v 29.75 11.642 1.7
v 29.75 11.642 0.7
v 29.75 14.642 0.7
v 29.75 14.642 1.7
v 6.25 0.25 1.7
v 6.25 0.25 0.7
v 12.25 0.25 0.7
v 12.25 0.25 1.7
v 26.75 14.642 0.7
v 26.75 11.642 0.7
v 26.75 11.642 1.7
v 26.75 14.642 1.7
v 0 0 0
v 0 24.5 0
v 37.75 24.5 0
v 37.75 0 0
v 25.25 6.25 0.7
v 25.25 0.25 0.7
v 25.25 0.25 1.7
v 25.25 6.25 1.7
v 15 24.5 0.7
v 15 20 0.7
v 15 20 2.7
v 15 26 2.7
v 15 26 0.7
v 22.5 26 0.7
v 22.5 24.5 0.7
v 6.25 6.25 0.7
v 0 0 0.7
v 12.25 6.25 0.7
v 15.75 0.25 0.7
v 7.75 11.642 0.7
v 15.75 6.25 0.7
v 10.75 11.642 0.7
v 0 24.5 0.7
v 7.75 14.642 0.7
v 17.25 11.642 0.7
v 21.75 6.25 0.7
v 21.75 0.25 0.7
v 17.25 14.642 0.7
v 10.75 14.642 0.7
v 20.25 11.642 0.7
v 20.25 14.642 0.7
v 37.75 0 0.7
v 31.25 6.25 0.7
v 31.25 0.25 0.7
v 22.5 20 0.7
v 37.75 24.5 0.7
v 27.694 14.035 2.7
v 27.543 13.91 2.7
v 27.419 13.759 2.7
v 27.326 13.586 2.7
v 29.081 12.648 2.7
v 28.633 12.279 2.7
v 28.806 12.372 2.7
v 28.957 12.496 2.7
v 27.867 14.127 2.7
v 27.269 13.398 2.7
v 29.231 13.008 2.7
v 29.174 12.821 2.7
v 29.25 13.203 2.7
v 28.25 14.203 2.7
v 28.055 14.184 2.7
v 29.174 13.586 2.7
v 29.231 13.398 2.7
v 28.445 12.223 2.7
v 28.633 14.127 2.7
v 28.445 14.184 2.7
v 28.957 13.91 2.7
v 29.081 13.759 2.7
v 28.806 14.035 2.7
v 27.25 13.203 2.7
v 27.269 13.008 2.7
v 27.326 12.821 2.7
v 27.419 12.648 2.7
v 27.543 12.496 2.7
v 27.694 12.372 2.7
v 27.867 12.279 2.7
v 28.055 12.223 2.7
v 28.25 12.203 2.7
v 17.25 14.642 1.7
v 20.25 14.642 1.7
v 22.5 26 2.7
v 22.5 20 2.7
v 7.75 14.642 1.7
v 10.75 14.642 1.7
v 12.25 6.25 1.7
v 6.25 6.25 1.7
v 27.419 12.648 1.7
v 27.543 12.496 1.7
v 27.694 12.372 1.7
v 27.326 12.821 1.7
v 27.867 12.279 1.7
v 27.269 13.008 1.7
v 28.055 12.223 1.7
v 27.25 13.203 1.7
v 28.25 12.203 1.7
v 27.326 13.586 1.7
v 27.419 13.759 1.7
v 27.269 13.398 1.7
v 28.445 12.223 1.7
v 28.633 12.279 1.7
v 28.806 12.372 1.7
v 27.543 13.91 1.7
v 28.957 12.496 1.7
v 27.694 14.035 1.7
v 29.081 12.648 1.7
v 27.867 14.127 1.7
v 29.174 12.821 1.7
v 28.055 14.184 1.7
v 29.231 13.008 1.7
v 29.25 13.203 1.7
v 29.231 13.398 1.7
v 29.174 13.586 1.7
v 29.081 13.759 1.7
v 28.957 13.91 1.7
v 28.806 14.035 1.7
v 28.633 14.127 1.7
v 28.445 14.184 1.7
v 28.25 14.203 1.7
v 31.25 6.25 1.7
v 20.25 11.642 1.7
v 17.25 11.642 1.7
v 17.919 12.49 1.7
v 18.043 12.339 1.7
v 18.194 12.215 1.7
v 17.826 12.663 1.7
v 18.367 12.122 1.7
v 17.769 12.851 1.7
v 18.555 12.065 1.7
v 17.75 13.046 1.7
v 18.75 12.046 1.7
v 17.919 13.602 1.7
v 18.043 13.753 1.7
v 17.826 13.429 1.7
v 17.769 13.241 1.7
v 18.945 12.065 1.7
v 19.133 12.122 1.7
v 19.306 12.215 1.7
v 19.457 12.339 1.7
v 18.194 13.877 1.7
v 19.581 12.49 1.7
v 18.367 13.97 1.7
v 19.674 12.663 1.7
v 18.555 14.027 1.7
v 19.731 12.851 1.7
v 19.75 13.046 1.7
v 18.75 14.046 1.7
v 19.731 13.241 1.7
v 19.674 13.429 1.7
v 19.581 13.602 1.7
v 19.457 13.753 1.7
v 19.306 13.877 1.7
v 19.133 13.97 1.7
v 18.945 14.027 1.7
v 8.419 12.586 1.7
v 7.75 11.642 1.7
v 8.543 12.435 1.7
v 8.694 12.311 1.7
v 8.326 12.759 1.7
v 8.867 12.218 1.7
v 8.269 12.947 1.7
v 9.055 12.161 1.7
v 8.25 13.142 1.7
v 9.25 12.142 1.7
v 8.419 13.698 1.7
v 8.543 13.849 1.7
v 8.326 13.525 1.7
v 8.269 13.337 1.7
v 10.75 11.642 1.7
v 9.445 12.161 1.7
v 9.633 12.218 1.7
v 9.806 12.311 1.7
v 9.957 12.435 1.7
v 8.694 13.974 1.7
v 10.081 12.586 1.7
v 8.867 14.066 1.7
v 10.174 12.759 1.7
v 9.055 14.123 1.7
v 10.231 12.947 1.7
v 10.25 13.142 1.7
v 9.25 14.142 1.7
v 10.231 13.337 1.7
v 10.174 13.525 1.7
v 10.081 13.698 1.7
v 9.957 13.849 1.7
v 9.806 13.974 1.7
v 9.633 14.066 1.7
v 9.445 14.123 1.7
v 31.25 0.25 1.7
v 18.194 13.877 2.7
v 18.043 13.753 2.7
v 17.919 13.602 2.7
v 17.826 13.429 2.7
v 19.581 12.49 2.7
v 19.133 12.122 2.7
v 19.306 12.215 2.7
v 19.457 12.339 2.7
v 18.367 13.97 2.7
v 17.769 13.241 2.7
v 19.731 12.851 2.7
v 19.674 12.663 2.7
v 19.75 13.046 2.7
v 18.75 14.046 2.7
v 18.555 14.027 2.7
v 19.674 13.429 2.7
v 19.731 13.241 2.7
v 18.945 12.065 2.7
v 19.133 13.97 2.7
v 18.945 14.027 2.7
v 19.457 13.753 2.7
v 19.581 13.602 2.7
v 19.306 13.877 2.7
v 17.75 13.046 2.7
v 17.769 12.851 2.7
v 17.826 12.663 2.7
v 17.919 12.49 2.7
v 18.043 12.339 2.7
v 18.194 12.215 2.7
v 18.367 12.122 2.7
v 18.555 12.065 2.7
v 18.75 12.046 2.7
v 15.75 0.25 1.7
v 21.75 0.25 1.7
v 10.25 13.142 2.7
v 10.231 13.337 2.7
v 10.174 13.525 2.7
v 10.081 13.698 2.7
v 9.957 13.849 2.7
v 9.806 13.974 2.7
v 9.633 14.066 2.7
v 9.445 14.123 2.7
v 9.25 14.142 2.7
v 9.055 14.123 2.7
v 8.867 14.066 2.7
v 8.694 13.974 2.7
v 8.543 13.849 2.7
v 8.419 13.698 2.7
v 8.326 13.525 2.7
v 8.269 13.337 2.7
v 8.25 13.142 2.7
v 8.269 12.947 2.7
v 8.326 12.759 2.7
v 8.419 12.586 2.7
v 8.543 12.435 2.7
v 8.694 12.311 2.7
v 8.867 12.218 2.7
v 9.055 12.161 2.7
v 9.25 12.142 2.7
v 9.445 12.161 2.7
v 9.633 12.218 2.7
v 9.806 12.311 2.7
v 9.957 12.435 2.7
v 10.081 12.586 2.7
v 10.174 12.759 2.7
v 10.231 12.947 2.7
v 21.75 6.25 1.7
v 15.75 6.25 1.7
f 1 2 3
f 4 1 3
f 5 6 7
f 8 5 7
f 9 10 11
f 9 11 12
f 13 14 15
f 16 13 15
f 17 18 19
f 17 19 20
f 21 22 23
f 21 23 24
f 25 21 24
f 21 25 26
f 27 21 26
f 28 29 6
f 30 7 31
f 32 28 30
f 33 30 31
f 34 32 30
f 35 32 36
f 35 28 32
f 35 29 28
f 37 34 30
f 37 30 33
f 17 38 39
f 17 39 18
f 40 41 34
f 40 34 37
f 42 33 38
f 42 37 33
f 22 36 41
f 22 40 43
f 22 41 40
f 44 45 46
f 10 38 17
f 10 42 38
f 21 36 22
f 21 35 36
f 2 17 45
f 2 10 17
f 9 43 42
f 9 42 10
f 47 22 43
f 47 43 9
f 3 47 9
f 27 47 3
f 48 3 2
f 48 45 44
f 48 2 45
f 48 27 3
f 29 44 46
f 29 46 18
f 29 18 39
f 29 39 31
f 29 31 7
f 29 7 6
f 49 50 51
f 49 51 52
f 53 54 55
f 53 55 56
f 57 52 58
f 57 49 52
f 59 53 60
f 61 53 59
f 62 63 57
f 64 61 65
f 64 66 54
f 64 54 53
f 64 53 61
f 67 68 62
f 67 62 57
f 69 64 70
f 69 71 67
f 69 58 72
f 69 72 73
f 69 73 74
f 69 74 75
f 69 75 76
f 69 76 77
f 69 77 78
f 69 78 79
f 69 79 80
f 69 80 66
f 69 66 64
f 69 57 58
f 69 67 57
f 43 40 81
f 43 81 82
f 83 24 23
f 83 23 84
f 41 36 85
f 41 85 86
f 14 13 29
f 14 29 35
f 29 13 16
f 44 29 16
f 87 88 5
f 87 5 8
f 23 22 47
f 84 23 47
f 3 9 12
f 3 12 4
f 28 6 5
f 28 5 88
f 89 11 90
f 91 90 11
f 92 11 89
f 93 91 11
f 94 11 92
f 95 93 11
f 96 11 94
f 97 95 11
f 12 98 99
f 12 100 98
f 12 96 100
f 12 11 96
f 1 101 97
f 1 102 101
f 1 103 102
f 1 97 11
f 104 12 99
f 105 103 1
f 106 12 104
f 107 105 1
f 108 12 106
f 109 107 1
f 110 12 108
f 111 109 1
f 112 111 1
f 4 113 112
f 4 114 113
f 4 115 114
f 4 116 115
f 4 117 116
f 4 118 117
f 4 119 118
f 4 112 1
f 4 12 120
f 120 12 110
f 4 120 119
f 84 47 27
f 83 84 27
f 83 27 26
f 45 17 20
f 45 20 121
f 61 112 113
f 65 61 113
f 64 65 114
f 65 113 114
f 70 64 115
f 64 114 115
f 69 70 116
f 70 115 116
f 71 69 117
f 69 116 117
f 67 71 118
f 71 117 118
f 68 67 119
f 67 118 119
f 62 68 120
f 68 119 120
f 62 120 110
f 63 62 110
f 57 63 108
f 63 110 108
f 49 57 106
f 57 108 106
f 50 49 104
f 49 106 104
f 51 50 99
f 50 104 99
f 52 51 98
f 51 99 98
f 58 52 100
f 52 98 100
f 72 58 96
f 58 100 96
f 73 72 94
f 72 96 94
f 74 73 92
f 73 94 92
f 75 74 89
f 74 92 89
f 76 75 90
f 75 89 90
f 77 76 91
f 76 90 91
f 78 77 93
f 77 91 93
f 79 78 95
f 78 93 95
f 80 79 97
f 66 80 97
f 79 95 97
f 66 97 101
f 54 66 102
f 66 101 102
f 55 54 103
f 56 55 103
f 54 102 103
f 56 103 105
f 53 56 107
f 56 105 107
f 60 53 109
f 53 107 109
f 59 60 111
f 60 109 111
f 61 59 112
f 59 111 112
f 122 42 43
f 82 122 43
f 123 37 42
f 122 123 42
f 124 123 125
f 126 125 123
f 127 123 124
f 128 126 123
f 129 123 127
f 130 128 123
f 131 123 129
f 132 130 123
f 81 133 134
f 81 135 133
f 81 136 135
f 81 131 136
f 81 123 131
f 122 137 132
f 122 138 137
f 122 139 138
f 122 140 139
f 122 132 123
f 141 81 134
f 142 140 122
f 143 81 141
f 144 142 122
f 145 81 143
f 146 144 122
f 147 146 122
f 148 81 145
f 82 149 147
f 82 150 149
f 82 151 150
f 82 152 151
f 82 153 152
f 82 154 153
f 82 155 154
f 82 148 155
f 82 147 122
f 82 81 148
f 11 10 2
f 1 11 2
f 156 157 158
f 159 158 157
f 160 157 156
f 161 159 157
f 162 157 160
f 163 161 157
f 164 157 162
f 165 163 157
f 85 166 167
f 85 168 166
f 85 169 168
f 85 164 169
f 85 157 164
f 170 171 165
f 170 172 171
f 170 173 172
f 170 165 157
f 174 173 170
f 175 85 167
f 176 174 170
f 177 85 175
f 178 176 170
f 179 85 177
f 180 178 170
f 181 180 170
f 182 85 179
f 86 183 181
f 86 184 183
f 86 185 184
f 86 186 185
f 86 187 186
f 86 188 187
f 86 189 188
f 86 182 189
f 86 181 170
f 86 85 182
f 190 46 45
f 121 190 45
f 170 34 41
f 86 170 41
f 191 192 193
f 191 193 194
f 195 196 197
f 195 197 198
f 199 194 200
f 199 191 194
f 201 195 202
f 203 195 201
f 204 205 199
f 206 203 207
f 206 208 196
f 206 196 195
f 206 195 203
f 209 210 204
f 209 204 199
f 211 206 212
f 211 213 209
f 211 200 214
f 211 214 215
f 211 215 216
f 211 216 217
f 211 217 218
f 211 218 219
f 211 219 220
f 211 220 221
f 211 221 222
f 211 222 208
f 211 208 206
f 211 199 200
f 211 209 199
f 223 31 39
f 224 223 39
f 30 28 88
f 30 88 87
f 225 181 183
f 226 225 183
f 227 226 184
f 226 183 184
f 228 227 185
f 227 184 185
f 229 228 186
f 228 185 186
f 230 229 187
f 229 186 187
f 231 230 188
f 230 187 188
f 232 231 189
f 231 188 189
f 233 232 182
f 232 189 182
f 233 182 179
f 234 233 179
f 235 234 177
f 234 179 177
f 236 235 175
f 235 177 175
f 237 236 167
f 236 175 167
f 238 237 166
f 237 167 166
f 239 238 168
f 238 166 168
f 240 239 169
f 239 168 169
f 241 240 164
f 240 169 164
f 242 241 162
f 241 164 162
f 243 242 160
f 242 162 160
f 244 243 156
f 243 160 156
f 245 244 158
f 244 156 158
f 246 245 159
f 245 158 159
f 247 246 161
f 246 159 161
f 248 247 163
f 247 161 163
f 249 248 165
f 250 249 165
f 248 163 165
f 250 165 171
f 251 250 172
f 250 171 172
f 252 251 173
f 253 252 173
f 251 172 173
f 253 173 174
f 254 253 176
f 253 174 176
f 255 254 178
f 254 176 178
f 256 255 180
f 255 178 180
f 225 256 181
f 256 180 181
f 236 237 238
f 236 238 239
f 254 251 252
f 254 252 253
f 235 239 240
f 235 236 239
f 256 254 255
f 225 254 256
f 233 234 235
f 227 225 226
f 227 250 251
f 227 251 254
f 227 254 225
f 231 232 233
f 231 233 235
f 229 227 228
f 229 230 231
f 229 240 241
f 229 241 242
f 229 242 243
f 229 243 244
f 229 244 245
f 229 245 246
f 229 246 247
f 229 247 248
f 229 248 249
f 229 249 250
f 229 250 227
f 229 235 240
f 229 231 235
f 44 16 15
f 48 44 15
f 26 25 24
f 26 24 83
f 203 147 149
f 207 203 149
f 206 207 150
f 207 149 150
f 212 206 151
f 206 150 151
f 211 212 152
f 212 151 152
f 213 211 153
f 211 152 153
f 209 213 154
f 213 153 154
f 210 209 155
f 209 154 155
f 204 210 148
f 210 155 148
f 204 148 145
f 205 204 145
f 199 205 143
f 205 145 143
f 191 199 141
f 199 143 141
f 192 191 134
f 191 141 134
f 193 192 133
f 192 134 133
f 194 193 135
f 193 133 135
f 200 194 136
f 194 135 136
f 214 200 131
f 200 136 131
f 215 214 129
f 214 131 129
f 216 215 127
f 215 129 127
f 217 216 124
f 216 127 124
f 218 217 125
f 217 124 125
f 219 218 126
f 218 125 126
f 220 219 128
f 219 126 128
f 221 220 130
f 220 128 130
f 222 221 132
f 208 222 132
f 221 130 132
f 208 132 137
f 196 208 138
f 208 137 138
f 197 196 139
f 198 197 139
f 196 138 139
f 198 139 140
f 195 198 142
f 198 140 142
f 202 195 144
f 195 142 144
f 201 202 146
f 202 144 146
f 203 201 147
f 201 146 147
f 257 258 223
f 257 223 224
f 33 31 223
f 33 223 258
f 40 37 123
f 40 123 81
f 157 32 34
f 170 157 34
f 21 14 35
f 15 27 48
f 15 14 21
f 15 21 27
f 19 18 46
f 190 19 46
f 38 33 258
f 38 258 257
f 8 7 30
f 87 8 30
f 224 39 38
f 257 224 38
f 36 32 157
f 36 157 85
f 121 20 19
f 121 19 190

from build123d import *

# Parameters (mm, degrees)
F0_W     = 37.75
F0_H     = 24.5
F1_DEPTH = 0.7
F2_W     = 6
F2_H     = 6
F3_DEPTH = 1
F4_W     = 3
F4_H     = 3
F5_DEPTH = 1
F6_R     = 1
F7_DEPTH = 1
F8_W     = 7.5
F8_H     = 6
F9_DEPTH = 2


with BuildPart() as f1:
    # F0 (on Top) → F1 (new body)
    with BuildSketch(Plane.XY):
        with Locations((18.875, 12.25)):
            Rectangle(F0_W, F0_H)
    extrude(amount=F1_DEPTH)

    # F2 (on face) → F3 (join)
    with BuildSketch(Plane.XY.offset(0.7)):
        with Locations((9.25, 3.25)):
            Rectangle(F2_W, F2_H)
        with Locations((18.75, 3.25)):
            Rectangle(F2_W, F2_H)
        with Locations((28.25, 3.25)):
            Rectangle(F2_W, F2_H)
    extrude(amount=F3_DEPTH)

    # F4 (on face) → F5 (join)
    with BuildSketch(Plane.XY.offset(0.7)):
        with Locations((9.25, 13.142036)):
            Rectangle(F4_W, F4_H)
        with Locations((18.75, 13.142036)):
            Rectangle(F4_W, F4_H)
        with Locations((28.25, 13.142036)):
            Rectangle(F4_W, F4_H)
    extrude(amount=F5_DEPTH)

    # F6 (on face) → F7 (join)
    with BuildSketch(Plane.XY.offset(1.7)):
        with Locations((9.25, 13.142036)):
            Circle(F6_R)
        with Locations((18.75, 13.046024)):
            Circle(F6_R)
        with Locations((28.25, 13.203288)):
            Circle(F6_R)
    extrude(amount=F7_DEPTH)

    # F8 (on face) → F9 (join)
    with BuildSketch(Plane.XY.offset(0.7)):
        with Locations((18.75, 23)):
            Rectangle(F8_W, F8_H)
    extrude(amount=F9_DEPTH)


solid = f1.part
